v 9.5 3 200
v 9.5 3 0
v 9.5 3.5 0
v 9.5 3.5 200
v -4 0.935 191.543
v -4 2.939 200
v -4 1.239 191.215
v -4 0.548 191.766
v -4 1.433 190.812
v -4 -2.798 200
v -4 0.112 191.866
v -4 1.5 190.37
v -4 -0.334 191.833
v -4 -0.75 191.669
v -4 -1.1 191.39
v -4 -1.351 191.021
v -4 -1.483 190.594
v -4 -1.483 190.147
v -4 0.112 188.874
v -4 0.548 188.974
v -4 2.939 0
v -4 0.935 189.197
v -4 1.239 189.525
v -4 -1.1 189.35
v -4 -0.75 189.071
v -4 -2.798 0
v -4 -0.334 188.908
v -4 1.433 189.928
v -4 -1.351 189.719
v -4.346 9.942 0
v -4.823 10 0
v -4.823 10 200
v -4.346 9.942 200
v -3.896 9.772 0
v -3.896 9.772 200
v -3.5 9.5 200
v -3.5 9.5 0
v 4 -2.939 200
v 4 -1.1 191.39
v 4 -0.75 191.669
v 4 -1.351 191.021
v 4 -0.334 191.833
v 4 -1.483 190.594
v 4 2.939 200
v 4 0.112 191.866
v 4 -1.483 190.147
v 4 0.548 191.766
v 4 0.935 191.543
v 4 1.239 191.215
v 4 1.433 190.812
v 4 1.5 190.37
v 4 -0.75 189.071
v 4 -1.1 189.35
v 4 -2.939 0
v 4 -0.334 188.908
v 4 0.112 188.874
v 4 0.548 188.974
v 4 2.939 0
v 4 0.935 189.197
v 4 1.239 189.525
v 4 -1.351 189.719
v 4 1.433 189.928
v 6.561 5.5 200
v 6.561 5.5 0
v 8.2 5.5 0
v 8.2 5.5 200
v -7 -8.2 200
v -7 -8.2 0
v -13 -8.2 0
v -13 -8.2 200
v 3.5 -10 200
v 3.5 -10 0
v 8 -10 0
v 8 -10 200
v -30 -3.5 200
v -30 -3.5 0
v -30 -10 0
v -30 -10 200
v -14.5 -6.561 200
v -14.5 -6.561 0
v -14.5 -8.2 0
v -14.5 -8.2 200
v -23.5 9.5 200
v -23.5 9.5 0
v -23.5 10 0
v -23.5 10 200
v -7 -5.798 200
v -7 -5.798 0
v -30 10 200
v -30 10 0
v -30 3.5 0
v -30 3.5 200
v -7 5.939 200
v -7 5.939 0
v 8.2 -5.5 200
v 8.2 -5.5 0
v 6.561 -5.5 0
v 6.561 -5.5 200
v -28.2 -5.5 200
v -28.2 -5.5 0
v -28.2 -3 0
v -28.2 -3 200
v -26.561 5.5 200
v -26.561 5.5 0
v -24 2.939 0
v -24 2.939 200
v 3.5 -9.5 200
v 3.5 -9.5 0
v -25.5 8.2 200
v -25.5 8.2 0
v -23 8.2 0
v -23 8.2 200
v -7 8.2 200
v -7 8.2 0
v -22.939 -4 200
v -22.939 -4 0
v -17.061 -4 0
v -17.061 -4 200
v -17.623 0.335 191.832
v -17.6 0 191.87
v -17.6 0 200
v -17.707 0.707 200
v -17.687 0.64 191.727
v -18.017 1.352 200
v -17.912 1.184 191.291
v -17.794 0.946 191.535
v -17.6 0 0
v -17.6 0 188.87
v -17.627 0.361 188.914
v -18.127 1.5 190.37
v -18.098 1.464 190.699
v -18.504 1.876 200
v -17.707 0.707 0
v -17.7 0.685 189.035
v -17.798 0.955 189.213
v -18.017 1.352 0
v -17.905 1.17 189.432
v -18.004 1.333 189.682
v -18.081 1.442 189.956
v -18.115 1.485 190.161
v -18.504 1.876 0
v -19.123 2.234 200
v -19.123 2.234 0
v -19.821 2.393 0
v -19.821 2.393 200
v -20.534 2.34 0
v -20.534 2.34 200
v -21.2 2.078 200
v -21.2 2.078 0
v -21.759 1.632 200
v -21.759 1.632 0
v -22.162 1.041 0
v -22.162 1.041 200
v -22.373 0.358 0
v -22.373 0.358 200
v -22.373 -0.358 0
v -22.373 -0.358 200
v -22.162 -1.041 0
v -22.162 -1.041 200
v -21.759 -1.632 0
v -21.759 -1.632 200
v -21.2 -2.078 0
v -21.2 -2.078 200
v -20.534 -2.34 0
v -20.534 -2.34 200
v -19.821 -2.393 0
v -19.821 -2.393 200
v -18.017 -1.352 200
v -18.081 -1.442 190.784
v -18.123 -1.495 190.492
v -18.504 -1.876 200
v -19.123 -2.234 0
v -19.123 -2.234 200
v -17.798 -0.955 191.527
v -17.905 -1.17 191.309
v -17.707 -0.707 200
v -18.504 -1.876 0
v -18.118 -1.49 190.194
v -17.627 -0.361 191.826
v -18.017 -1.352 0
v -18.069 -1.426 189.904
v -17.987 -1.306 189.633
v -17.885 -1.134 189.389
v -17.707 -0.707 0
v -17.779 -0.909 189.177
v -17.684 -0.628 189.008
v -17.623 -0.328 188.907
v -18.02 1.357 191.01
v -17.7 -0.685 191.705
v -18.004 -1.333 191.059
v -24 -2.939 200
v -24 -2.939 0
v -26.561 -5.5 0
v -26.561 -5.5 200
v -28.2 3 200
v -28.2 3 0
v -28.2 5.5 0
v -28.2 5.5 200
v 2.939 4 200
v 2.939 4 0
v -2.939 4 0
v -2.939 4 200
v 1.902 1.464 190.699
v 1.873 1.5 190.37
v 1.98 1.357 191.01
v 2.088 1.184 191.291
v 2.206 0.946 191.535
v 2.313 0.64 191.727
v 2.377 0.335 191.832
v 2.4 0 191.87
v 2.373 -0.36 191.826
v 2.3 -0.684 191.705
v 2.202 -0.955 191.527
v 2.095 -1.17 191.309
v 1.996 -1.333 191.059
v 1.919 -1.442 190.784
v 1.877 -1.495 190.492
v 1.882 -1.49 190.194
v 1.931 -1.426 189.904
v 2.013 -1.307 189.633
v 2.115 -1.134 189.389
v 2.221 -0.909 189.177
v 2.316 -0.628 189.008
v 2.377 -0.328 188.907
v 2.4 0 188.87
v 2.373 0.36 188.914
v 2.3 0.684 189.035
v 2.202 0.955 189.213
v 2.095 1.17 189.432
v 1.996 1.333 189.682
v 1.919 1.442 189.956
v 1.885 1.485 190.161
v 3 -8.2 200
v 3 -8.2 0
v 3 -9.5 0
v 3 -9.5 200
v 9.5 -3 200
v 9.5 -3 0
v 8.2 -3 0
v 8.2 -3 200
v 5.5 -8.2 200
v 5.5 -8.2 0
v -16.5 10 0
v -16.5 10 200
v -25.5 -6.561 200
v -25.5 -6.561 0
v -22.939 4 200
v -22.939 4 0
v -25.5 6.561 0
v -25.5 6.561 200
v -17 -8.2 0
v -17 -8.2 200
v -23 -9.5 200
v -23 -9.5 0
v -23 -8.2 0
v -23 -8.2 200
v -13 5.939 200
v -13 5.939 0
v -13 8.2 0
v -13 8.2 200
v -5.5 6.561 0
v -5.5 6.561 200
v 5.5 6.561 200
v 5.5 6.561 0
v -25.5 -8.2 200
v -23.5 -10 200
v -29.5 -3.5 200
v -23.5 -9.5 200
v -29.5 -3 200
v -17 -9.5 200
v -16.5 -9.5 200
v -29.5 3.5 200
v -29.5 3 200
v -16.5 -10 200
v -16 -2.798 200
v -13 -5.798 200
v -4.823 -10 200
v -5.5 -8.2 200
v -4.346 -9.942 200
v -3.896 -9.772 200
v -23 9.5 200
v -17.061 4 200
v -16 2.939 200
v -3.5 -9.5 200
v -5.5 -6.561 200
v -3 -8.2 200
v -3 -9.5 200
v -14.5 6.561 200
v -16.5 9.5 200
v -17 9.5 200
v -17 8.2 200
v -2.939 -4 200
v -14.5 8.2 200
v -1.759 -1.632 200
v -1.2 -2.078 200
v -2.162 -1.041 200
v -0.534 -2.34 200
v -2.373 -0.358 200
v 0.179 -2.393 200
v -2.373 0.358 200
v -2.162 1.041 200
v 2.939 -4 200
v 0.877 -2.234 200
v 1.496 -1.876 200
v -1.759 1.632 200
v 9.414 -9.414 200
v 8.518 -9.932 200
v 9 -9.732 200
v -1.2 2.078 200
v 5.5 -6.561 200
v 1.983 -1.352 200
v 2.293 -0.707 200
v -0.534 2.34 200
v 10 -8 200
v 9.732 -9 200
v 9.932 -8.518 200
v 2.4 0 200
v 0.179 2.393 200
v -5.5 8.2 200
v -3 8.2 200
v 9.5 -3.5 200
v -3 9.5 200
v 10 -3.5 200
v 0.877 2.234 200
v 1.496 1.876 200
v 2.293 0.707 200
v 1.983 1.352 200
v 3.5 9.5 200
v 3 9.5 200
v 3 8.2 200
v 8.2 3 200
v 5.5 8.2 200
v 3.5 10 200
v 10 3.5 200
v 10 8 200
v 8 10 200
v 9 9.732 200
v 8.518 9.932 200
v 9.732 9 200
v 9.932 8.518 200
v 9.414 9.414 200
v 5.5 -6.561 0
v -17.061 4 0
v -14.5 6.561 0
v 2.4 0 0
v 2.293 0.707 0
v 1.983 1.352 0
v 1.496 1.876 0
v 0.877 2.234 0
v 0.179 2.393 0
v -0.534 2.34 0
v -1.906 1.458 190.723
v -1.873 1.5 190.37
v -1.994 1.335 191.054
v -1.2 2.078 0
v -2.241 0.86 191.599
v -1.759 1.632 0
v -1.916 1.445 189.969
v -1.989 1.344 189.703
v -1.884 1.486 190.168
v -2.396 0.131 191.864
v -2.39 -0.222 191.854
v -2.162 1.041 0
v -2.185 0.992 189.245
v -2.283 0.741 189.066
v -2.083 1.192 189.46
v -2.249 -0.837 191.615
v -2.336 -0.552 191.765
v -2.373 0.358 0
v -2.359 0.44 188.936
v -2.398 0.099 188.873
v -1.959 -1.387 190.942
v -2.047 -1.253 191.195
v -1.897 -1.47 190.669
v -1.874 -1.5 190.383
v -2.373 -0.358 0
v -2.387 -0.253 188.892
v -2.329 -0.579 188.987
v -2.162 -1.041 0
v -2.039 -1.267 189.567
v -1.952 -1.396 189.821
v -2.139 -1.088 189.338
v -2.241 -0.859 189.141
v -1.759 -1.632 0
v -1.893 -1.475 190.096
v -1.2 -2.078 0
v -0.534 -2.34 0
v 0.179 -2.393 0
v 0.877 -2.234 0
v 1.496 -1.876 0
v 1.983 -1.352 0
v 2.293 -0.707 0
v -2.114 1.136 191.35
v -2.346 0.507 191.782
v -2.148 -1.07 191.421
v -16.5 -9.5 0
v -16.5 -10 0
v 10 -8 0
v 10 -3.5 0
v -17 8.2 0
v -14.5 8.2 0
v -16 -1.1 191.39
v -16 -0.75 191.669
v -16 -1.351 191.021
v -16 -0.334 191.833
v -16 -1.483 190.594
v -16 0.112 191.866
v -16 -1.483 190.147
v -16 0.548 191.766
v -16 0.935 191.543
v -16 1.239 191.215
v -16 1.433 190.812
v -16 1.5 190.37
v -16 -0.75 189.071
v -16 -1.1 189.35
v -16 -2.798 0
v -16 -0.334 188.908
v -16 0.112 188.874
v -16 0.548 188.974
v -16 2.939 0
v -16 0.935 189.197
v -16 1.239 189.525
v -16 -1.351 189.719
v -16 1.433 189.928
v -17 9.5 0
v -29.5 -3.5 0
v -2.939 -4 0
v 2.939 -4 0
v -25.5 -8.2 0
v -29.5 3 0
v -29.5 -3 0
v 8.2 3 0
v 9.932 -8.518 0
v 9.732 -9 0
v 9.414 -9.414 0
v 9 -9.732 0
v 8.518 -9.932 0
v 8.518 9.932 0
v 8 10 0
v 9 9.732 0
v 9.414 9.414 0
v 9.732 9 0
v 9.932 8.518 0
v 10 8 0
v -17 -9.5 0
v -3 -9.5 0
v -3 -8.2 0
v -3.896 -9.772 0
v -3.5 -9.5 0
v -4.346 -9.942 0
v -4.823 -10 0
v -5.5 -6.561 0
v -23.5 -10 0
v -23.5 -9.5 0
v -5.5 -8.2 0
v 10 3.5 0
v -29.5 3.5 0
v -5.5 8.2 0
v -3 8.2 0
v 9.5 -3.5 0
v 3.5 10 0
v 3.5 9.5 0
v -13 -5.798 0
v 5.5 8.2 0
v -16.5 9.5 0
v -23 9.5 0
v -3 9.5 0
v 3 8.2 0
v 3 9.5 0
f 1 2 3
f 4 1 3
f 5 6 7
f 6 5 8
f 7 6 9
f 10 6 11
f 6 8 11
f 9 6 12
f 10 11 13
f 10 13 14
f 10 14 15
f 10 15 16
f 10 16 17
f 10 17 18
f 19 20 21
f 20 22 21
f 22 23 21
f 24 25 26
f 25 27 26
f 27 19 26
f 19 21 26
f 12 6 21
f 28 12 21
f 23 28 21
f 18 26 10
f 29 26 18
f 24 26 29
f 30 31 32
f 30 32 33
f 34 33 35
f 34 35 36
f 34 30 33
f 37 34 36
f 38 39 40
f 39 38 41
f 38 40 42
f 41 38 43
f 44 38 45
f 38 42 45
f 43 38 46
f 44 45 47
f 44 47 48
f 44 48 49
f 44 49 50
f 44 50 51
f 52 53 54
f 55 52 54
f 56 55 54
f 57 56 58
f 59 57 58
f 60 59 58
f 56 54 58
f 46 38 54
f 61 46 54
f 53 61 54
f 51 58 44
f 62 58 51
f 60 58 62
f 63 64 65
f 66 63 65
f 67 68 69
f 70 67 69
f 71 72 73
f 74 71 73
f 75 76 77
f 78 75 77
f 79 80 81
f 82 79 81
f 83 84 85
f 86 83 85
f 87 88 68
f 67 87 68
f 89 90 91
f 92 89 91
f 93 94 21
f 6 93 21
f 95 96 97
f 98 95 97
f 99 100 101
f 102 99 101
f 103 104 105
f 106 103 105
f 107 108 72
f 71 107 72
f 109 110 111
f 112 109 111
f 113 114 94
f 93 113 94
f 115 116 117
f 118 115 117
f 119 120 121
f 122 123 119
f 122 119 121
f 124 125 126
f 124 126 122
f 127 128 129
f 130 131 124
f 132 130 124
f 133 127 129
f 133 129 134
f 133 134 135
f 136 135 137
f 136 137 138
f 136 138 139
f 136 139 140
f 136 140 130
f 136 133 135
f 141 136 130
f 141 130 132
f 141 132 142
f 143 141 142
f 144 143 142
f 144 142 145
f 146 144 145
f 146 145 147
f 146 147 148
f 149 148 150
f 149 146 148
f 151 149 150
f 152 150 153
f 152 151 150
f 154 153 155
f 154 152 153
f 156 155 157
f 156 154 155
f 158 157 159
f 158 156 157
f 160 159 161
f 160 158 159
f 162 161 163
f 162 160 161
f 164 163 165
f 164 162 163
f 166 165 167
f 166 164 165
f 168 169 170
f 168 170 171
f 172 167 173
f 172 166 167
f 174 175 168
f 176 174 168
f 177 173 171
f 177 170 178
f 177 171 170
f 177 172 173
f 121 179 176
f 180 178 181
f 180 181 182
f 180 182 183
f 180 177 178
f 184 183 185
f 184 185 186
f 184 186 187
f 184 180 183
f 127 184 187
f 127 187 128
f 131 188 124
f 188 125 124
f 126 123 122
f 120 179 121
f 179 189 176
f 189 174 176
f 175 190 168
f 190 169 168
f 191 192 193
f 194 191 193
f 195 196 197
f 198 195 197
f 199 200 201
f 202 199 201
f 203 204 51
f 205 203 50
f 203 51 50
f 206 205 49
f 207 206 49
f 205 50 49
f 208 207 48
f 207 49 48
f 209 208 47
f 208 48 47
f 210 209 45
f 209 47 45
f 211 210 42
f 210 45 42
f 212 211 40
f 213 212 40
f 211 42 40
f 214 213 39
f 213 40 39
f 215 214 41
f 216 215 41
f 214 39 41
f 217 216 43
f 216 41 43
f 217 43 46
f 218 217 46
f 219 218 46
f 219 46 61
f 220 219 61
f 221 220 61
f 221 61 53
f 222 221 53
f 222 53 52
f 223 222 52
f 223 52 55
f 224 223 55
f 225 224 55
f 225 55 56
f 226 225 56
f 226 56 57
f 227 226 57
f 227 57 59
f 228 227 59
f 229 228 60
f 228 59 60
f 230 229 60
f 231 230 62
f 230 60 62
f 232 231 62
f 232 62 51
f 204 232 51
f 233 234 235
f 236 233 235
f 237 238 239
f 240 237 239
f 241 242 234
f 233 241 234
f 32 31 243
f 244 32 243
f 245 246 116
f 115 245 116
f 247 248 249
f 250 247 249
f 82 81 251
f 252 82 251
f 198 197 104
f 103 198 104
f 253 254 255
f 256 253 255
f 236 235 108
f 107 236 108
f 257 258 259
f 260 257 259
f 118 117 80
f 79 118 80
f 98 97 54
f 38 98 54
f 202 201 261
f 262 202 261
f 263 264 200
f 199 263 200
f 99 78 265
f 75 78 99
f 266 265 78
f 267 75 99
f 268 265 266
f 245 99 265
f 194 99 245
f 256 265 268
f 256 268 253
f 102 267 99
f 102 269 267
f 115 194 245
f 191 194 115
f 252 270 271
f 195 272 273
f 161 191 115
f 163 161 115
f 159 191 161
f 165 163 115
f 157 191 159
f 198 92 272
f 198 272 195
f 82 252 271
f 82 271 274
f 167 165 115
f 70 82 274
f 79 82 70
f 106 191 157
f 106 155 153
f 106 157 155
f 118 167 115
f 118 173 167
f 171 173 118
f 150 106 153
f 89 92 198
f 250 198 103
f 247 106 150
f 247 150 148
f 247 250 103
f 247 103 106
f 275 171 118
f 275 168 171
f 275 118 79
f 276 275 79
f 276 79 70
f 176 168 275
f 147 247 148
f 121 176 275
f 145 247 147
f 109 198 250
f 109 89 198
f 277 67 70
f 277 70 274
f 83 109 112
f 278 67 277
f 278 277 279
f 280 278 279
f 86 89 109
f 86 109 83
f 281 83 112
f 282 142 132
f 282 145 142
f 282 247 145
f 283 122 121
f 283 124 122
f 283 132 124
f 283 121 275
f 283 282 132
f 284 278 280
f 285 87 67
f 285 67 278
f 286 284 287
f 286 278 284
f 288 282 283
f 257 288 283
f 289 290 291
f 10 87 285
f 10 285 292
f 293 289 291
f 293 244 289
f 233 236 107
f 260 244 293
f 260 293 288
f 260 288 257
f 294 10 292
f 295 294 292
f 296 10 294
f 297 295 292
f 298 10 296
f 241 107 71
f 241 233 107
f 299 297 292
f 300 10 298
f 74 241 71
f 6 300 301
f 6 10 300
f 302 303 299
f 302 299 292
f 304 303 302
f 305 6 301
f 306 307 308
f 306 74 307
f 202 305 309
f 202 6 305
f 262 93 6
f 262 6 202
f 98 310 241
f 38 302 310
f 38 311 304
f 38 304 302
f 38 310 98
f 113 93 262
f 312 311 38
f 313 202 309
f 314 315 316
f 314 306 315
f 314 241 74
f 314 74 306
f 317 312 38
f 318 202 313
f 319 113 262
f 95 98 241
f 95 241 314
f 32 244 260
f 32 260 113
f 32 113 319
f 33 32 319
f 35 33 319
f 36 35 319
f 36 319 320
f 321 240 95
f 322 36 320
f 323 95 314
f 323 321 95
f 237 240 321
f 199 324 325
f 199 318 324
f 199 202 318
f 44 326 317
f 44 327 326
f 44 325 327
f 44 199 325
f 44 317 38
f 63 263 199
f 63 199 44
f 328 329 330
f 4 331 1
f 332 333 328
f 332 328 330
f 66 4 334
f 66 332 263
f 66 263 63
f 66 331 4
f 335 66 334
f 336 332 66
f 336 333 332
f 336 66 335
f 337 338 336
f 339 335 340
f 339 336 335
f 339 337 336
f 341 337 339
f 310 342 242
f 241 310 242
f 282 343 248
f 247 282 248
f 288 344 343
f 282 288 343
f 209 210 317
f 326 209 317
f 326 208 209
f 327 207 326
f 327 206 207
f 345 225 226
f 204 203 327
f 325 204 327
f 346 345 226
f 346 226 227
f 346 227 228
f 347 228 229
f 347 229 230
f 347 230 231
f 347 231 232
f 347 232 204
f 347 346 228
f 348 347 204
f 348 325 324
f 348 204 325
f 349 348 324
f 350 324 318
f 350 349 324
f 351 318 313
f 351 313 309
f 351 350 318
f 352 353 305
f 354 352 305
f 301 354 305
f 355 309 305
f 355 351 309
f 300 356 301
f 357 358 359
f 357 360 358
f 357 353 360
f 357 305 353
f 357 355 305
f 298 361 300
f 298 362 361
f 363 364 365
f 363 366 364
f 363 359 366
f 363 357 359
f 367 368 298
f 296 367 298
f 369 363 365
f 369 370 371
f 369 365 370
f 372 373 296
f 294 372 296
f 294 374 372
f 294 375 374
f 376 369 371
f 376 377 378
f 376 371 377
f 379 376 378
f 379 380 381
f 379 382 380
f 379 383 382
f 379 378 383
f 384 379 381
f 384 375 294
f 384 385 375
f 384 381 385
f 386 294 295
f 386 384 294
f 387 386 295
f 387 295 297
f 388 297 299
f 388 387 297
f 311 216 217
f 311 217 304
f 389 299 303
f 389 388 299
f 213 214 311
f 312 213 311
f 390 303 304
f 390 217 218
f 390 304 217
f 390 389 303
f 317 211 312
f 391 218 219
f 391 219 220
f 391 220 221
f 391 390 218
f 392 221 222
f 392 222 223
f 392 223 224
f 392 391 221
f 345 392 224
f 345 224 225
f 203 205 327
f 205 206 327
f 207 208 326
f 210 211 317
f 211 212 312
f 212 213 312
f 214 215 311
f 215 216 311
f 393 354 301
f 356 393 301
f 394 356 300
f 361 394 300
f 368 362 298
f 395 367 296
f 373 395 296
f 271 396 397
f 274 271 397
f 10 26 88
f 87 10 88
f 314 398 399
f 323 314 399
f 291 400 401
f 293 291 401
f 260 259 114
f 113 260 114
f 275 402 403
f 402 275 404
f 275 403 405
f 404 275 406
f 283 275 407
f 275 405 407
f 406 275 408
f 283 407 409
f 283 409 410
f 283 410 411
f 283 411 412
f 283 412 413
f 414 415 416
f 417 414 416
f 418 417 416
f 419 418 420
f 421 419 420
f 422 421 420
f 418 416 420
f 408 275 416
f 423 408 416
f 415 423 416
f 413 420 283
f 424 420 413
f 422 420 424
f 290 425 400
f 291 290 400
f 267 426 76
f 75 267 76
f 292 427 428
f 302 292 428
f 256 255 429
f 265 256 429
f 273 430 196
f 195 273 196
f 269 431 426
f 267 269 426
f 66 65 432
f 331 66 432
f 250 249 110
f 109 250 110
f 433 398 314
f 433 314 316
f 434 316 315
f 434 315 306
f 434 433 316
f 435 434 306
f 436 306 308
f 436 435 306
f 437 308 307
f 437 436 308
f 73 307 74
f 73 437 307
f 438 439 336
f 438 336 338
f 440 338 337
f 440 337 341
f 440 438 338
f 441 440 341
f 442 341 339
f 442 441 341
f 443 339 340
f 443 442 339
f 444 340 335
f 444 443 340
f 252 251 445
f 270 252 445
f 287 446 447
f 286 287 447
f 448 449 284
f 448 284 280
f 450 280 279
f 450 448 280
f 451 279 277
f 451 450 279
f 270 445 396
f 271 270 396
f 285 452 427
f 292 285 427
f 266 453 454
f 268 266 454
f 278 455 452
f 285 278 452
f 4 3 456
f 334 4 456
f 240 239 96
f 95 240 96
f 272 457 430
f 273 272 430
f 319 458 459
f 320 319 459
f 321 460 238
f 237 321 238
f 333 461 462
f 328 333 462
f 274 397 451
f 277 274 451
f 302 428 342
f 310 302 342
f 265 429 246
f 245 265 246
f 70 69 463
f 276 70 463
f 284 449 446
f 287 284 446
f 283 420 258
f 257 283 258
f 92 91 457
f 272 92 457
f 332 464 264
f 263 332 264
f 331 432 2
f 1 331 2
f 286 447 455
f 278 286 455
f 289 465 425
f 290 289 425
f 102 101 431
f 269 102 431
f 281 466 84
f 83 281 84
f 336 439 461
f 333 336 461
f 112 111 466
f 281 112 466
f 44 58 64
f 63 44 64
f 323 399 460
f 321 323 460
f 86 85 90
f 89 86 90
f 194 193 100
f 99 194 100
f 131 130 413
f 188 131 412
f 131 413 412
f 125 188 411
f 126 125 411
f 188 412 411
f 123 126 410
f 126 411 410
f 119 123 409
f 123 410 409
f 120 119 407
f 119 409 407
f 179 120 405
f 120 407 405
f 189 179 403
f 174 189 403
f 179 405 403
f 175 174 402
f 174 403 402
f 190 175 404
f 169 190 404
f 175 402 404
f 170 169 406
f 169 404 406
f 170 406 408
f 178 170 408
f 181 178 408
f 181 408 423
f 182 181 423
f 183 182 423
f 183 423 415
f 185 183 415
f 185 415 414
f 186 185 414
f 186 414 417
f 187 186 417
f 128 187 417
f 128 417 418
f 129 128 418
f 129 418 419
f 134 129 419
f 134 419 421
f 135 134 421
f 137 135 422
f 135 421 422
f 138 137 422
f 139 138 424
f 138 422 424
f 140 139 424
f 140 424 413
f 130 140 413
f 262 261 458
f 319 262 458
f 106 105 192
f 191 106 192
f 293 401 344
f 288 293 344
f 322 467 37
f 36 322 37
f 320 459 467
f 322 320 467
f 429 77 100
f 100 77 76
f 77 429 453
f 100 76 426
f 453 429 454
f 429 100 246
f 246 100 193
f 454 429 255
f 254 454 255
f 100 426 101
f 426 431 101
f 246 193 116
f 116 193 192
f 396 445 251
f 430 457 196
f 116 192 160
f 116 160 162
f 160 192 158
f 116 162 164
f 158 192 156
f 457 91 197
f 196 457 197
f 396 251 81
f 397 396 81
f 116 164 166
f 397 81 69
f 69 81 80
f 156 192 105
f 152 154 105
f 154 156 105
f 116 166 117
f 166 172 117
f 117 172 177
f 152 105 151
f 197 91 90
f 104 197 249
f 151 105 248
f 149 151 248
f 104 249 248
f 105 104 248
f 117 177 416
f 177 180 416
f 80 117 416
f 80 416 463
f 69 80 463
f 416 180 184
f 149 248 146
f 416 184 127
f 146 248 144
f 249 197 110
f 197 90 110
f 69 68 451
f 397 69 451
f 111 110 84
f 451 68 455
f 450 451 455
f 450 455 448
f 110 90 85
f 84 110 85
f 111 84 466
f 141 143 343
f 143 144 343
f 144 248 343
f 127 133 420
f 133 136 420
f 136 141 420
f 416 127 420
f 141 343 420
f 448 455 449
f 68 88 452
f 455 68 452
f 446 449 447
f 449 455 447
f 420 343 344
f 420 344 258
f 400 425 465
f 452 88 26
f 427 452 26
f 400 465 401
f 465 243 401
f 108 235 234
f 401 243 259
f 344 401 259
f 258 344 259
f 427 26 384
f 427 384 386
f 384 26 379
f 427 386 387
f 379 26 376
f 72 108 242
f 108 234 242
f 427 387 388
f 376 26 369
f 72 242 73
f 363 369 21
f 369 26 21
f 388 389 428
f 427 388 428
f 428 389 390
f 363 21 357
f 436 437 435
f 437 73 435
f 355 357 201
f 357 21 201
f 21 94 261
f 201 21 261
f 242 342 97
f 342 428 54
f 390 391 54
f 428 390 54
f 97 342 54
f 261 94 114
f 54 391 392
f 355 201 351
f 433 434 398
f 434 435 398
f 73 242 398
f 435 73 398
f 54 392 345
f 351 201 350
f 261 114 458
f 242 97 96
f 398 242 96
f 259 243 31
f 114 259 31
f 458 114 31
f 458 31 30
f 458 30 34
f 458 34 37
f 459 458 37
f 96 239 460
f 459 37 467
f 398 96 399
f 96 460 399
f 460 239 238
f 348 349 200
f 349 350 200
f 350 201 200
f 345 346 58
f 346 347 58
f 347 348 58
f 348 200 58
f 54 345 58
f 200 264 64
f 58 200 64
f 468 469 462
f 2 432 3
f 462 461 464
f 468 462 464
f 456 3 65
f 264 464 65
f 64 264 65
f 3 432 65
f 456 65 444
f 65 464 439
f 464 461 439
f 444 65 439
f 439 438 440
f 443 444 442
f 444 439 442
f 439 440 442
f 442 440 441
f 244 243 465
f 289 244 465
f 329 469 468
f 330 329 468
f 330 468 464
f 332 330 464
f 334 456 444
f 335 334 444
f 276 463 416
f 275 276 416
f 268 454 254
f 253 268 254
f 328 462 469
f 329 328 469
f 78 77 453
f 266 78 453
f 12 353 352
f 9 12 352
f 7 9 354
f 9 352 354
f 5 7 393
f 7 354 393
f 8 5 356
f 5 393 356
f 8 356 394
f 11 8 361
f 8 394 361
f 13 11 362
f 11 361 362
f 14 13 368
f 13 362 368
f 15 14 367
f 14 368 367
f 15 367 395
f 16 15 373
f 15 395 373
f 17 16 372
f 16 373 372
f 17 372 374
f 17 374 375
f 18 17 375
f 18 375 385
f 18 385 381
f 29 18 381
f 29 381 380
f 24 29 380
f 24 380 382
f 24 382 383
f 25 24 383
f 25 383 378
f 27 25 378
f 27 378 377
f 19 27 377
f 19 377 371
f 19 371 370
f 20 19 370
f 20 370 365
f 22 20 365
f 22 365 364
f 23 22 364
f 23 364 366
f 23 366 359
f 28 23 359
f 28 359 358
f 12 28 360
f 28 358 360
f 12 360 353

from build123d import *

# Parameters (mm, degrees)
F0_R        = 2.4
F1_DEPTH    = 200
F2_T1_DEPTH = 210
F2_T3_DEPTH = 206.6143782777
F3_R        = 1.5
F4_DEPTH    = 25


# Not quite as in the source:
# - a fillet or chamfer that OpenCascade refuses, or shapes differently, is made with other operations: its cross-section is extruded or revolved along the edge and cut away or added


with BuildPart() as f1:
    # F0 (on Top) → F1 (new body)
    with BuildSketch(Plane.XY):
        Polygon((10, 3.5), (10, 10), (3.5, 10), (3.5, 9.5), (3, 9.5), (3, 8.2), (5.5, 8.2), (5.5, 6.5606601718), (2.9393398282, 4), (0, 4), (-2.9393398282, 4), (-5.5, 6.5606601718), (-5.5, 8.2), (-3, 8.2), (-3, 9.5), (-3.5, 9.5), (-3.5, 10), (-10, 10), (-16.5, 10), (-16.5, 9.5), (-17, 9.5), (-17, 8.2), (-14.5, 8.2), (-14.5, 6.5606601718), (-17.0606601718, 4), (-20, 4), (-22.9393398282, 4), (-25.5, 6.5606601718), (-25.5, 8.2), (-23, 8.2), (-23, 9.5), (-23.5, 9.5), (-23.5, 10), (-30, 10), (-30, 3.5), (-29.5, 3.5), (-29.5, 3), (-28.2, 3), (-28.2, 5.5), (-26.5606601718, 5.5), (-24, 2.9393398282), (-24, -2.9393398282), (-26.5606601718, -5.5), (-28.2, -5.5), (-28.2, -3), (-29.5, -3), (-29.5, -3.5), (-30, -3.5), (-30, -10), (-23.5, -10), (-23.5, -9.5), (-23, -9.5), (-23, -8.2), (-25.5, -8.2), (-25.5, -6.5606601718), (-22.9393398282, -4), (-20, -4), (-17.0606601718, -4), (-14.5, -6.5606601718), (-14.5, -8.2), (-17, -8.2), (-17, -9.5), (-16.5, -9.5), (-16.5, -10), (-10, -10), (-3.5, -10), (-3.5, -9.5), (-3, -9.5), (-3, -8.2), (-5.5, -8.2), (-5.5, -6.5606601718), (-2.9393398282, -4), (0, -4), (2.9393398282, -4), (5.5, -6.5606601718), (5.5, -8.2), (3, -8.2), (3, -9.5), (3.5, -9.5), (3.5, -10), (10, -10), (10, -3.5), (9.5, -3.5), (9.5, -3), (8.2, -3), (8.2, -5.5), (6.5606601718, -5.5), (4, -2.9393398282), (4, 2.9393398282), (6.5606601718, 5.5), (8.2, 5.5), (8.2, 3), (9.5, 3), (9.5, 3.5), align=None)
        with Locations((-20, 0)):
            Circle(F0_R, mode=Mode.SUBTRACT)
        Polygon((-7, 5.9393398282), (-4, 2.9393398282), (-4, -2.797918472), (-7, -5.797918472), (-7, -8.2), (-13, -8.2), (-13, -5.797918472), (-16, -2.797918472), (-16, 2.9393398282), (-13, 5.9393398282), (-13, 8.2), (-7, 8.2), align=None, mode=Mode.SUBTRACT)
        Circle(F0_R, mode=Mode.SUBTRACT)
    extrude(amount=F1_DEPTH)

    # F2: fillet of radius 2 on 4 edges, made by hand

    # F2_s2 → F2_t1 (cut)
    with BuildSketch(Plane.XY.offset(-5)):
        with BuildLine():
            ThreePointArc((8, 10), (9.4142135624, 9.4142135624), (10, 8))
            Line((10, 8), (10, 10))
            Line((10, 10), (8, 10))
        make_face()
        with BuildLine():
            ThreePointArc((10, -8), (9.4142135624, -9.4142135624), (8, -10))
            Line((8, -10), (10, -10))
            Line((10, -10), (10, -8))
        make_face()
    extrude(amount=F2_T1_DEPTH, mode=Mode.SUBTRACT)

    # F2_s4 → F2_t3 (cut)
    with BuildSketch(Plane.XY.offset(-3.3071891388)):
        with BuildLine():
            ThreePointArc((-3.5, -9.5), (-4.1157688743, -9.8708286934), (-4.8228756555, -10))
            Line((-4.8228756555, -10), (-3.5, -10))
            Line((-3.5, -10), (-3.5, -9.5))
        make_face()
        with BuildLine():
            ThreePointArc((-4.8228756555, 10), (-4.1157688743, 9.8708286934), (-3.5, 9.5))
            Line((-3.5, 9.5), (-3.5, 10))
            Line((-3.5, 10), (-4.8228756555, 10))
        make_face()
    extrude(amount=F2_T3_DEPTH, mode=Mode.SUBTRACT)

    # F3 (on face) → F4 (cut)
    with BuildSketch(Plane.YZ.offset(4)):
        with Locations((0, 190.370157361)):
            Circle(F3_R)
    extrude(amount=-F4_DEPTH, mode=Mode.SUBTRACT)


solid = f1.part
